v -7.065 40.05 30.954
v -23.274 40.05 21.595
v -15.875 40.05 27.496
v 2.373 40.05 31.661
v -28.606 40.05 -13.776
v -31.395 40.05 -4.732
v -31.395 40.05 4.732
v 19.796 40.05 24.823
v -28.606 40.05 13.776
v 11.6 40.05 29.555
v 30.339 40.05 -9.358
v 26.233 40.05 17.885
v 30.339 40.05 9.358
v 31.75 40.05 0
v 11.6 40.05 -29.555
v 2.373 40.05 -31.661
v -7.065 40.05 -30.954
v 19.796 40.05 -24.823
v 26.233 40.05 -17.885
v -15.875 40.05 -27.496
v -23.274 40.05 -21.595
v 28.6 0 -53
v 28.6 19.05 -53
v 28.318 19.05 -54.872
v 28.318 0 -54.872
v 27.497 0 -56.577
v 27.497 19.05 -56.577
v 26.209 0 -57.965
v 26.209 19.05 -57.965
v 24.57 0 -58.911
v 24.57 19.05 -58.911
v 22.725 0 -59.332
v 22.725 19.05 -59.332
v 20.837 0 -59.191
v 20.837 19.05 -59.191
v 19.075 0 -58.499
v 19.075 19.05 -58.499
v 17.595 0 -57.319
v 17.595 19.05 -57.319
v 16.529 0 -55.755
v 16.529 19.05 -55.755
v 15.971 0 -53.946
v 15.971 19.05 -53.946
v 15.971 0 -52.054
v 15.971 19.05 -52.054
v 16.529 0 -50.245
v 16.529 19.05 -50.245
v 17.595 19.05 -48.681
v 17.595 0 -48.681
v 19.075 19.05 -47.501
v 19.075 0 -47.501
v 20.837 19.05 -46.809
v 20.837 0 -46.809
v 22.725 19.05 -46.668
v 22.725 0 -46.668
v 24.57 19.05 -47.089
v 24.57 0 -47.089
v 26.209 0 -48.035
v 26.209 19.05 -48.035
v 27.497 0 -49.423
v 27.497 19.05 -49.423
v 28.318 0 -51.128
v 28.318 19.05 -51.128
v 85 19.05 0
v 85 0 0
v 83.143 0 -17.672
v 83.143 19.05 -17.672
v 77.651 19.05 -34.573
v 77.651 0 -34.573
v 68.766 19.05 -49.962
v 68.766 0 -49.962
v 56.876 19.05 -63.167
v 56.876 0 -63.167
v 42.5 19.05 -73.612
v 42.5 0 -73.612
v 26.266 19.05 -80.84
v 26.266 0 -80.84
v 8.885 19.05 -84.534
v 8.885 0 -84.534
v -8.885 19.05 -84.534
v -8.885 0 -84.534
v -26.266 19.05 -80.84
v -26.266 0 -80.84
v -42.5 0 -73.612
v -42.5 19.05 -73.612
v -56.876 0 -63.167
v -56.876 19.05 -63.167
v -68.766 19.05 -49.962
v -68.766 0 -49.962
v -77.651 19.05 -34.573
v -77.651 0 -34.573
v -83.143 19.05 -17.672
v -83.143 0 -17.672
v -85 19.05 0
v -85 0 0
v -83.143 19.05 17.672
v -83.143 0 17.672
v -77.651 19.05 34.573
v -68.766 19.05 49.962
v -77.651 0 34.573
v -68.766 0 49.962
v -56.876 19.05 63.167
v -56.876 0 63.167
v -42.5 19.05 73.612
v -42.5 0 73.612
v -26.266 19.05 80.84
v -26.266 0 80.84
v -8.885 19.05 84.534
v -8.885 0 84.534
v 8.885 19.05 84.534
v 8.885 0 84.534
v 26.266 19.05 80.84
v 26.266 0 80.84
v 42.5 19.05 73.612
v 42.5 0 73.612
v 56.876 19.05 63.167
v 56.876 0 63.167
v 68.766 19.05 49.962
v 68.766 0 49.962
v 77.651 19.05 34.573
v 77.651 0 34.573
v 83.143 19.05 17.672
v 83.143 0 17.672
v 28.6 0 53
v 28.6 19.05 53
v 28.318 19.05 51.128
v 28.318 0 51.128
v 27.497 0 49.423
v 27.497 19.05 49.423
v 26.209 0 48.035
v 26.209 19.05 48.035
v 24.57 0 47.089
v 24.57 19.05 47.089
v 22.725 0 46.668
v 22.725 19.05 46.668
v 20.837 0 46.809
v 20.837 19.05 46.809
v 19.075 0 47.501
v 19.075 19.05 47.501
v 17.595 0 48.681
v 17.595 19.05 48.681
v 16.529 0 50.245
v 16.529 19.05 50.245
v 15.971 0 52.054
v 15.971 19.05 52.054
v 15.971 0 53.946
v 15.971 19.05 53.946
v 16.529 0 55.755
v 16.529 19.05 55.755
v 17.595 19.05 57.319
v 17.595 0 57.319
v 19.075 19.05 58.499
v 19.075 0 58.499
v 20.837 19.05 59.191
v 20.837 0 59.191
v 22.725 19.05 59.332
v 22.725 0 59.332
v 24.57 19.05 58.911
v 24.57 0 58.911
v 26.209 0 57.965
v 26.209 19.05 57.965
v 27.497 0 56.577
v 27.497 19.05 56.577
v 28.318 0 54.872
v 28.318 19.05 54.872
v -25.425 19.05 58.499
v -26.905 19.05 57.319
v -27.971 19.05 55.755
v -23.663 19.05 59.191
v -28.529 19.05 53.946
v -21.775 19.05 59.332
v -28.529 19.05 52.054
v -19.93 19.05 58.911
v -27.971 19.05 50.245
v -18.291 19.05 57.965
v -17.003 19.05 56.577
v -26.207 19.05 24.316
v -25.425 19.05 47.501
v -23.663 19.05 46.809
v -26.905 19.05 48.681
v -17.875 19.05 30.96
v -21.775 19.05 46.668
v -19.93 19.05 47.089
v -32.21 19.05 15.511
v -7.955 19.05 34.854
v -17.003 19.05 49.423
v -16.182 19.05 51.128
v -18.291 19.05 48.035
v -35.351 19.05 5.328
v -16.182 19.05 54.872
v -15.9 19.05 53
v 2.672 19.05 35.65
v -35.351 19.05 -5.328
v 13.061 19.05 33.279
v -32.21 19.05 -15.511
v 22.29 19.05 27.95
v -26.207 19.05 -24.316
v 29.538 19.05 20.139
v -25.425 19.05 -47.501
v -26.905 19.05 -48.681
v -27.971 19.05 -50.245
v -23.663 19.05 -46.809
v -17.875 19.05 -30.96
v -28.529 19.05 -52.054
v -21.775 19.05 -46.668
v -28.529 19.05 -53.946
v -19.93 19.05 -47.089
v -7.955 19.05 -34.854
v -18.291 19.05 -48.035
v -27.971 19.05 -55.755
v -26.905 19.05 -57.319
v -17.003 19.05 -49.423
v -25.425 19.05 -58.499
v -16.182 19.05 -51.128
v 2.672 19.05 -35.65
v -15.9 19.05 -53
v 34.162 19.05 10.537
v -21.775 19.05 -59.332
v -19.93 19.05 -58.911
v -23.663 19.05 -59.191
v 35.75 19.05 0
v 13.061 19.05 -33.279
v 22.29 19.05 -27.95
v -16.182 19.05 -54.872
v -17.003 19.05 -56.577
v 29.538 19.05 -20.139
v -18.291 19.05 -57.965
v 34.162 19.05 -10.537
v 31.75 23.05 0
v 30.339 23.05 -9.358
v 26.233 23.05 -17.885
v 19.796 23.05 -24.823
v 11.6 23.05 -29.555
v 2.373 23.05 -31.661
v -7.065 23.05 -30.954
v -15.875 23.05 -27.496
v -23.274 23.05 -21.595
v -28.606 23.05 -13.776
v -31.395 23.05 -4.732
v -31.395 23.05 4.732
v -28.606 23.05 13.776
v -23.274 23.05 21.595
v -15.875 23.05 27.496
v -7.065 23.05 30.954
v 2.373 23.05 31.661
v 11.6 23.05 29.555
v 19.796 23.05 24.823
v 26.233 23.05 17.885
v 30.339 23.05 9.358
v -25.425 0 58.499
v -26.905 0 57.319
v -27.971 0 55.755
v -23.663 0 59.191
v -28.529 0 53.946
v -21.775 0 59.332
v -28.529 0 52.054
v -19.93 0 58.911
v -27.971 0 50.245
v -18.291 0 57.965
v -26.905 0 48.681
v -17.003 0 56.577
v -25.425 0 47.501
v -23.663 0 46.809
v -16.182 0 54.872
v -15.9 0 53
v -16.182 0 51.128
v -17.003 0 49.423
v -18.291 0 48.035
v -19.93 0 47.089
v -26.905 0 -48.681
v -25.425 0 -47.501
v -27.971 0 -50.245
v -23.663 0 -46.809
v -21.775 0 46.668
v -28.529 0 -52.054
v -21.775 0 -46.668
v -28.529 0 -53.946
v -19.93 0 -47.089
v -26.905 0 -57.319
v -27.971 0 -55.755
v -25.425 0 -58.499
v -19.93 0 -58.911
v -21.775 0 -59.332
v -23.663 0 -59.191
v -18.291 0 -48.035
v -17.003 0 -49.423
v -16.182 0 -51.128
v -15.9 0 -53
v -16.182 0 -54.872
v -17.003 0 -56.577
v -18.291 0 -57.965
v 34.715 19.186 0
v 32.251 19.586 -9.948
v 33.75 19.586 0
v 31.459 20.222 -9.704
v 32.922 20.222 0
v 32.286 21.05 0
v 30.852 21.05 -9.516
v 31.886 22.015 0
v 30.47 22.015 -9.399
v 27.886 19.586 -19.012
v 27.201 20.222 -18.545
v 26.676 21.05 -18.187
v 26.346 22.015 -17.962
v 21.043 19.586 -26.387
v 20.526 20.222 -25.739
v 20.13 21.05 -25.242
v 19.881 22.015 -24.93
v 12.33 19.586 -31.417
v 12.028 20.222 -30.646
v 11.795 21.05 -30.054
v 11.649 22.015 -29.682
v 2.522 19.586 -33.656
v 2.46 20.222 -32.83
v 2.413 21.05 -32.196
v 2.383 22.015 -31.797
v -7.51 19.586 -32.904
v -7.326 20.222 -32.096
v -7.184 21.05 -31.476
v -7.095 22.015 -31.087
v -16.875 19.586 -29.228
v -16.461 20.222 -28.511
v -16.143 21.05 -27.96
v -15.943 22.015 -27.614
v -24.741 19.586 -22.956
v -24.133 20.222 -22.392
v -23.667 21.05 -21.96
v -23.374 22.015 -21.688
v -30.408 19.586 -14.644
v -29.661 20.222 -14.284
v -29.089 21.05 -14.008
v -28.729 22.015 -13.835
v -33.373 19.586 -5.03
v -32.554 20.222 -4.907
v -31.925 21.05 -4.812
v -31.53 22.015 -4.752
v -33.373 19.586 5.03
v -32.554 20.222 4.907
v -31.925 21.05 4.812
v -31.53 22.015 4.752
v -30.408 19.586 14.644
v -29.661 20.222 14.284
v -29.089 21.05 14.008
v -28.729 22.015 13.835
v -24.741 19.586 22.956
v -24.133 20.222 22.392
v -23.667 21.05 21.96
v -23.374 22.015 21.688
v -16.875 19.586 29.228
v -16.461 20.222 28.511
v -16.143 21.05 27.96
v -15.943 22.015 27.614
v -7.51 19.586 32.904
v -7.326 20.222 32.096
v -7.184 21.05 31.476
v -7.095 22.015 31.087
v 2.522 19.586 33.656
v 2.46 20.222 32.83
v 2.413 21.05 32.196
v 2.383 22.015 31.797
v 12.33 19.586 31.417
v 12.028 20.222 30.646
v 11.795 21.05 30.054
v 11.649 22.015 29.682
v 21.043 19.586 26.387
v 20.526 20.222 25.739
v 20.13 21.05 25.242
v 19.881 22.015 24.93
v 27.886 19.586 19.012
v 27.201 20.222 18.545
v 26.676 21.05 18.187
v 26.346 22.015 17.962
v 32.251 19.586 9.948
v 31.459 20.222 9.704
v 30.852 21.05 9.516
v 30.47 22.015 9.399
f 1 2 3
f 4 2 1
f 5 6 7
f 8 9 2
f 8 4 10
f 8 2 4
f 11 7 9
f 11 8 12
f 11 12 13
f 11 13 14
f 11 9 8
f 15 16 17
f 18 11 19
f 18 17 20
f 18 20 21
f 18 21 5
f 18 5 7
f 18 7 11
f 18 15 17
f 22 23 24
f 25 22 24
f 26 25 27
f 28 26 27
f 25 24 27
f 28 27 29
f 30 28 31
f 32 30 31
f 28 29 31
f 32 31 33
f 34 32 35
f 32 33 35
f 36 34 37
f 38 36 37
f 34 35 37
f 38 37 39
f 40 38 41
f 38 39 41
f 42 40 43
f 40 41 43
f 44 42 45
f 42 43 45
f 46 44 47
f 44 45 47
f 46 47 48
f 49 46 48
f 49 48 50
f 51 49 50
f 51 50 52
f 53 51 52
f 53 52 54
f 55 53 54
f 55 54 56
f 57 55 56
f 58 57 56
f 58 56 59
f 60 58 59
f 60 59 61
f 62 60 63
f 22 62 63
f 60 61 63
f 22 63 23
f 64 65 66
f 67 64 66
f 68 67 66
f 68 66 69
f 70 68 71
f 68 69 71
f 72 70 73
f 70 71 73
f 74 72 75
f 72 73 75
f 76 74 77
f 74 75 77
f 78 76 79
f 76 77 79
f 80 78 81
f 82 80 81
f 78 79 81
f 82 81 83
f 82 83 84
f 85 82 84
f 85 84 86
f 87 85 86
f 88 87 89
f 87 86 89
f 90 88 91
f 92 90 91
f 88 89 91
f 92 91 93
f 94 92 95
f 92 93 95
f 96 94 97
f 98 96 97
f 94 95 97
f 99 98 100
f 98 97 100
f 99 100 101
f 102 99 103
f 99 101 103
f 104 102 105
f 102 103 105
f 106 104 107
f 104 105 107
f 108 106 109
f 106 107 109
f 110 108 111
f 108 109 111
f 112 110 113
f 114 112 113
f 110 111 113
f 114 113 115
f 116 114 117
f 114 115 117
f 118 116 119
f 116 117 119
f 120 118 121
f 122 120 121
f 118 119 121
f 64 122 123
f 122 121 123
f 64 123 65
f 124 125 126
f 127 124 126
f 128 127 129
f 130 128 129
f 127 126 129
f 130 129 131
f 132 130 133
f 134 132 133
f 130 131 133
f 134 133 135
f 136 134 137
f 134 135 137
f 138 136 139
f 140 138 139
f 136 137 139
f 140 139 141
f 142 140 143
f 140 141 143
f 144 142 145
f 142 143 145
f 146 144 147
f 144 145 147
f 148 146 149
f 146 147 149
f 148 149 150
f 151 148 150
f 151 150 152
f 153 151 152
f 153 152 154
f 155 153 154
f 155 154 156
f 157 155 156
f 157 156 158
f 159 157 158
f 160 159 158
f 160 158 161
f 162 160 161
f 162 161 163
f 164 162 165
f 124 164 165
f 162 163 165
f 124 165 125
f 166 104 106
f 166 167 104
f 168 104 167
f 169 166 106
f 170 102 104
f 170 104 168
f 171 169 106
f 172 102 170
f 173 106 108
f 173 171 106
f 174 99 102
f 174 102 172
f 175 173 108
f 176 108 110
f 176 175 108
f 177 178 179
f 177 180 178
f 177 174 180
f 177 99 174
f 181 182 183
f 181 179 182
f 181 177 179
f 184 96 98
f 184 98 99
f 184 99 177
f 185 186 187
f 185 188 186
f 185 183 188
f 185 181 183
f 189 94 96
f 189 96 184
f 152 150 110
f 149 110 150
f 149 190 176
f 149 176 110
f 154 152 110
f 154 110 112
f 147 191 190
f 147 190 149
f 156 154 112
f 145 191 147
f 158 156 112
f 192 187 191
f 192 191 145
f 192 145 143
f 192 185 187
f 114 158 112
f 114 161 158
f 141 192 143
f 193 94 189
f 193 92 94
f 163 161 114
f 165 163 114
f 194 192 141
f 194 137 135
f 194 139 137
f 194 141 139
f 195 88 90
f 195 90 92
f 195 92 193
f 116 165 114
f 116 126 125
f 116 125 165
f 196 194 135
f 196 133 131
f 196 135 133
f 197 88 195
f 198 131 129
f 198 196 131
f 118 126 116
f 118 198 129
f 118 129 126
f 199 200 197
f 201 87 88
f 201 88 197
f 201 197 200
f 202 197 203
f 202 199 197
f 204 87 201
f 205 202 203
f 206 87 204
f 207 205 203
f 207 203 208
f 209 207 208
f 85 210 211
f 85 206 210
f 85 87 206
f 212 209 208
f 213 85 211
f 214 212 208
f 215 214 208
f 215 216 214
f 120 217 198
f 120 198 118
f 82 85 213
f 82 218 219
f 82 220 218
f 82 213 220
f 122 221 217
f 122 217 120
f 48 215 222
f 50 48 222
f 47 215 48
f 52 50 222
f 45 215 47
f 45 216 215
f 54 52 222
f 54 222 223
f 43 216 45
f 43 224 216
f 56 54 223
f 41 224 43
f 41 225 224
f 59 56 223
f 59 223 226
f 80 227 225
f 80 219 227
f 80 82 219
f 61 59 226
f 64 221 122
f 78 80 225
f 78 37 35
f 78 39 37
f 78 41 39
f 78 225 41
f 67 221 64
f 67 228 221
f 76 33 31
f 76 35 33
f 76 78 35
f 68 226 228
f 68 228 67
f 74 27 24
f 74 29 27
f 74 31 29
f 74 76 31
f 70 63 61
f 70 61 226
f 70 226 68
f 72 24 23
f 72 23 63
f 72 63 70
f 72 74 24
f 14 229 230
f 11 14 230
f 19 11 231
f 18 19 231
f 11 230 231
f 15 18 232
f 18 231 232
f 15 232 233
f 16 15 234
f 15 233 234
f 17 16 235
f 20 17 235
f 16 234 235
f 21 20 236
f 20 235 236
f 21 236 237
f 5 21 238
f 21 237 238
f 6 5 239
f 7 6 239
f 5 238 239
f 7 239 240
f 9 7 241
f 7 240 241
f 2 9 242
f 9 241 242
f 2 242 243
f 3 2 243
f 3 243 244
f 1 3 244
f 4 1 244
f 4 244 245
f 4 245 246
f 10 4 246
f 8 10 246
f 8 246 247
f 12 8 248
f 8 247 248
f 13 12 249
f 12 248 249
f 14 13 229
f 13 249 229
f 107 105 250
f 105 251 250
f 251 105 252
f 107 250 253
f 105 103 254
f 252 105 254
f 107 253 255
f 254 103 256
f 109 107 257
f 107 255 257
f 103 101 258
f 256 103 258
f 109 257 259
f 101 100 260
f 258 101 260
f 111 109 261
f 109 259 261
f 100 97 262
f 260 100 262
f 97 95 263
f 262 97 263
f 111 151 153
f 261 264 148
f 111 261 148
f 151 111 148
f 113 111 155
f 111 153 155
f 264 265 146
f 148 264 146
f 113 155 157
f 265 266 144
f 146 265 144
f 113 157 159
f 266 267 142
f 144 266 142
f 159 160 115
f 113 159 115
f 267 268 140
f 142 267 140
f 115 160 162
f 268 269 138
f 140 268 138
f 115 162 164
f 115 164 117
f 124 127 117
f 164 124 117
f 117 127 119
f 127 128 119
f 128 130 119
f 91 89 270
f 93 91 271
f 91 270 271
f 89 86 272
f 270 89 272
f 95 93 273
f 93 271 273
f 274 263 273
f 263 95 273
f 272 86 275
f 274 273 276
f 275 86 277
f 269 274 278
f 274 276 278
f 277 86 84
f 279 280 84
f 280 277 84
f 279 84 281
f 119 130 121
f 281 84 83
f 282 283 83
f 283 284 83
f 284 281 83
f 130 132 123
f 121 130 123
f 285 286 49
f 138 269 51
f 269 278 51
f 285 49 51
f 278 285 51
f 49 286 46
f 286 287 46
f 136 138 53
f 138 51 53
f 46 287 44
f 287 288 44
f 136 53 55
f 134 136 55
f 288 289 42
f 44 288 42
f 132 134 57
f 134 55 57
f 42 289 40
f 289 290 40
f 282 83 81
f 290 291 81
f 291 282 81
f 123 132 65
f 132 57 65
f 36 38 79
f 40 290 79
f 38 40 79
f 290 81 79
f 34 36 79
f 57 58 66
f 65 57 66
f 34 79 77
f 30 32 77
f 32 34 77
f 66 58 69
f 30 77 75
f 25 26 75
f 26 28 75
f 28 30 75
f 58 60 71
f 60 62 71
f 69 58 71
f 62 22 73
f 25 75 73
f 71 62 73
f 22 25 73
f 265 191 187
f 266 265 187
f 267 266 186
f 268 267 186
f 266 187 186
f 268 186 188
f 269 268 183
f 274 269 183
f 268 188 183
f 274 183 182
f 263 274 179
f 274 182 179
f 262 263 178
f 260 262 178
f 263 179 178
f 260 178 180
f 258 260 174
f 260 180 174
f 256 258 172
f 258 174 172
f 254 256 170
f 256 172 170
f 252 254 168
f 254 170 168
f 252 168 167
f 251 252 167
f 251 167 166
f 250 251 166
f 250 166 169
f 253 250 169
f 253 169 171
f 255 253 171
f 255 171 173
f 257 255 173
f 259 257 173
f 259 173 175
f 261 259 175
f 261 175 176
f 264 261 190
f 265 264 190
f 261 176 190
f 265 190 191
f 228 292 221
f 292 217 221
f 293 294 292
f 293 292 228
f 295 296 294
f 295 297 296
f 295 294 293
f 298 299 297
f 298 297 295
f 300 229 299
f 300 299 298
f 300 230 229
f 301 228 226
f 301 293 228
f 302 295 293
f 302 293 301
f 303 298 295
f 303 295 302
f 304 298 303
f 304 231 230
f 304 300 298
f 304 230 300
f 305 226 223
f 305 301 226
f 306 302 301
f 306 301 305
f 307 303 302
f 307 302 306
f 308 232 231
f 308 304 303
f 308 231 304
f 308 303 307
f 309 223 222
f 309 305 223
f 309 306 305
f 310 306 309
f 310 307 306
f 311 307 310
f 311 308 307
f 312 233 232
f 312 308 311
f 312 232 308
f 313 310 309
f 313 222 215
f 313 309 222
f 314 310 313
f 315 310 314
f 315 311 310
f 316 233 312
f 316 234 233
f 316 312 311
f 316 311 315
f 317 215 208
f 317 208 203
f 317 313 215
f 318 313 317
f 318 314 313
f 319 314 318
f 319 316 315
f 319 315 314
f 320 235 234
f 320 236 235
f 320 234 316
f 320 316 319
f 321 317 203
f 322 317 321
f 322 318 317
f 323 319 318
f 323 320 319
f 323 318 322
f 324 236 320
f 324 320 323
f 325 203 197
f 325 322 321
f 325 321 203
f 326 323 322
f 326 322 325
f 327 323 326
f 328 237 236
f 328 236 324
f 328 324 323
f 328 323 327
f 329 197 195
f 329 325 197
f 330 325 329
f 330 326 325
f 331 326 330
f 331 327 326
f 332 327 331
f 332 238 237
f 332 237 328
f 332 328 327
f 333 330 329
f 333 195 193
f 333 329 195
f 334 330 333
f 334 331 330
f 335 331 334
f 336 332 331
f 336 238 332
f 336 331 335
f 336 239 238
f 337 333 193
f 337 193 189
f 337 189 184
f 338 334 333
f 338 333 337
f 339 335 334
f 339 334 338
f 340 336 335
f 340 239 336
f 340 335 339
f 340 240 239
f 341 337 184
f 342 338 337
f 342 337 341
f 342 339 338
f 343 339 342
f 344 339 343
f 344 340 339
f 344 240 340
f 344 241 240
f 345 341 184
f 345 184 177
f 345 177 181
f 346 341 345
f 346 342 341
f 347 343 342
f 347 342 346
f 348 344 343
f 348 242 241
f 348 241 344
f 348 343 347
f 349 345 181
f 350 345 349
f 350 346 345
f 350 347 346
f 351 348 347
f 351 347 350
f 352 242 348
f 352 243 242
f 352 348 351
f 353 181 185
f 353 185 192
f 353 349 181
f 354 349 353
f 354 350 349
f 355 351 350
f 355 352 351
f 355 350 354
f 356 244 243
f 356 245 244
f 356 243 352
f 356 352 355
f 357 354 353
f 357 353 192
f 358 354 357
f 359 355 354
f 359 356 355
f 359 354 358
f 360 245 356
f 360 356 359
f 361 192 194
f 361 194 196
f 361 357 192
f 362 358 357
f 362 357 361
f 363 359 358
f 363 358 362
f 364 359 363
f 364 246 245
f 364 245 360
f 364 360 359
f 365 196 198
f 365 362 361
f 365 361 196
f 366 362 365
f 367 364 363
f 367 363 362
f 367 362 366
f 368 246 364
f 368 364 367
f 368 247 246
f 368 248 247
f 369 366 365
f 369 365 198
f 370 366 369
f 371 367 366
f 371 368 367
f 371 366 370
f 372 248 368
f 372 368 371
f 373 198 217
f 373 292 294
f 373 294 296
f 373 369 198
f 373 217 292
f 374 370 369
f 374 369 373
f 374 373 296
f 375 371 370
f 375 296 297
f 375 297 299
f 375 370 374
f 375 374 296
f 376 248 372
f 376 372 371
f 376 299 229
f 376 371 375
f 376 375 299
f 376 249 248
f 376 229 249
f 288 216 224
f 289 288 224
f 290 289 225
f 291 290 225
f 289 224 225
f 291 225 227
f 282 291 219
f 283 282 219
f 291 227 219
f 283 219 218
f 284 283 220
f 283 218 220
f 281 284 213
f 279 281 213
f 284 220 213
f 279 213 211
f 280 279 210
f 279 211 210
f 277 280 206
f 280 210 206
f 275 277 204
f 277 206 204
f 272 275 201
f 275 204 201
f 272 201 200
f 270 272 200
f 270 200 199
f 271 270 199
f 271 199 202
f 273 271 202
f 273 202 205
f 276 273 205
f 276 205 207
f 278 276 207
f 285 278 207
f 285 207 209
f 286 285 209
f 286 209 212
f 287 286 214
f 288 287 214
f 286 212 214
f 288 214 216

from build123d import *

# Parameters (mm, degrees)
CROQUIS1_R              = 85
SALIENTE_EXTRUIR1_DEPTH = 19.05
CROQUIS2_R              = 31.75
SALIENTE_EXTRUIR2_DEPTH = 21
REDONDEO1_R             = 4
CROQUIS3_R              = 6.35
CORTAR_EXTRUIR1_DEPTH   = 19.05


with BuildPart() as part:
    # Croquis1 → Saliente-Extruir1 (new body)
    with BuildSketch(Plane(origin=(0, 0, 0), x_dir=(1, 0, 0), z_dir=(0, 1, 0))):
        Circle(CROQUIS1_R)
    extrude(amount=SALIENTE_EXTRUIR1_DEPTH)

    # Croquis2 → Saliente-Extruir2 (add)
    with BuildSketch(Plane(origin=(0, 19.05, 0), x_dir=(1, 0, 0), z_dir=(0, 1, 0))):
        Circle(CROQUIS2_R)
    extrude(amount=SALIENTE_EXTRUIR2_DEPTH)

    # Redondeo1
    redondeo1_edges = [part.edges().sort_by_distance(p)[0] for p in [
        (-31.75, 19.05, 0),
    ]]
    fillet(redondeo1_edges, radius=REDONDEO1_R)

    # Croquis3 → Cortar-Extruir1 (cut)
    with BuildSketch(Plane(origin=(0, 19.05, 0), x_dir=(1, 0, 0), z_dir=(0, 1, 0))):
        with Locations((-22.25, -53)):
            Circle(CROQUIS3_R)
        with Locations((-22.25, 53)):
            Circle(CROQUIS3_R)
        with Locations((22.25, 53)):
            Circle(CROQUIS3_R)
        with Locations((22.25, -53)):
            Circle(CROQUIS3_R)
    extrude(amount=-CORTAR_EXTRUIR1_DEPTH, mode=Mode.SUBTRACT)


solid = part.part
